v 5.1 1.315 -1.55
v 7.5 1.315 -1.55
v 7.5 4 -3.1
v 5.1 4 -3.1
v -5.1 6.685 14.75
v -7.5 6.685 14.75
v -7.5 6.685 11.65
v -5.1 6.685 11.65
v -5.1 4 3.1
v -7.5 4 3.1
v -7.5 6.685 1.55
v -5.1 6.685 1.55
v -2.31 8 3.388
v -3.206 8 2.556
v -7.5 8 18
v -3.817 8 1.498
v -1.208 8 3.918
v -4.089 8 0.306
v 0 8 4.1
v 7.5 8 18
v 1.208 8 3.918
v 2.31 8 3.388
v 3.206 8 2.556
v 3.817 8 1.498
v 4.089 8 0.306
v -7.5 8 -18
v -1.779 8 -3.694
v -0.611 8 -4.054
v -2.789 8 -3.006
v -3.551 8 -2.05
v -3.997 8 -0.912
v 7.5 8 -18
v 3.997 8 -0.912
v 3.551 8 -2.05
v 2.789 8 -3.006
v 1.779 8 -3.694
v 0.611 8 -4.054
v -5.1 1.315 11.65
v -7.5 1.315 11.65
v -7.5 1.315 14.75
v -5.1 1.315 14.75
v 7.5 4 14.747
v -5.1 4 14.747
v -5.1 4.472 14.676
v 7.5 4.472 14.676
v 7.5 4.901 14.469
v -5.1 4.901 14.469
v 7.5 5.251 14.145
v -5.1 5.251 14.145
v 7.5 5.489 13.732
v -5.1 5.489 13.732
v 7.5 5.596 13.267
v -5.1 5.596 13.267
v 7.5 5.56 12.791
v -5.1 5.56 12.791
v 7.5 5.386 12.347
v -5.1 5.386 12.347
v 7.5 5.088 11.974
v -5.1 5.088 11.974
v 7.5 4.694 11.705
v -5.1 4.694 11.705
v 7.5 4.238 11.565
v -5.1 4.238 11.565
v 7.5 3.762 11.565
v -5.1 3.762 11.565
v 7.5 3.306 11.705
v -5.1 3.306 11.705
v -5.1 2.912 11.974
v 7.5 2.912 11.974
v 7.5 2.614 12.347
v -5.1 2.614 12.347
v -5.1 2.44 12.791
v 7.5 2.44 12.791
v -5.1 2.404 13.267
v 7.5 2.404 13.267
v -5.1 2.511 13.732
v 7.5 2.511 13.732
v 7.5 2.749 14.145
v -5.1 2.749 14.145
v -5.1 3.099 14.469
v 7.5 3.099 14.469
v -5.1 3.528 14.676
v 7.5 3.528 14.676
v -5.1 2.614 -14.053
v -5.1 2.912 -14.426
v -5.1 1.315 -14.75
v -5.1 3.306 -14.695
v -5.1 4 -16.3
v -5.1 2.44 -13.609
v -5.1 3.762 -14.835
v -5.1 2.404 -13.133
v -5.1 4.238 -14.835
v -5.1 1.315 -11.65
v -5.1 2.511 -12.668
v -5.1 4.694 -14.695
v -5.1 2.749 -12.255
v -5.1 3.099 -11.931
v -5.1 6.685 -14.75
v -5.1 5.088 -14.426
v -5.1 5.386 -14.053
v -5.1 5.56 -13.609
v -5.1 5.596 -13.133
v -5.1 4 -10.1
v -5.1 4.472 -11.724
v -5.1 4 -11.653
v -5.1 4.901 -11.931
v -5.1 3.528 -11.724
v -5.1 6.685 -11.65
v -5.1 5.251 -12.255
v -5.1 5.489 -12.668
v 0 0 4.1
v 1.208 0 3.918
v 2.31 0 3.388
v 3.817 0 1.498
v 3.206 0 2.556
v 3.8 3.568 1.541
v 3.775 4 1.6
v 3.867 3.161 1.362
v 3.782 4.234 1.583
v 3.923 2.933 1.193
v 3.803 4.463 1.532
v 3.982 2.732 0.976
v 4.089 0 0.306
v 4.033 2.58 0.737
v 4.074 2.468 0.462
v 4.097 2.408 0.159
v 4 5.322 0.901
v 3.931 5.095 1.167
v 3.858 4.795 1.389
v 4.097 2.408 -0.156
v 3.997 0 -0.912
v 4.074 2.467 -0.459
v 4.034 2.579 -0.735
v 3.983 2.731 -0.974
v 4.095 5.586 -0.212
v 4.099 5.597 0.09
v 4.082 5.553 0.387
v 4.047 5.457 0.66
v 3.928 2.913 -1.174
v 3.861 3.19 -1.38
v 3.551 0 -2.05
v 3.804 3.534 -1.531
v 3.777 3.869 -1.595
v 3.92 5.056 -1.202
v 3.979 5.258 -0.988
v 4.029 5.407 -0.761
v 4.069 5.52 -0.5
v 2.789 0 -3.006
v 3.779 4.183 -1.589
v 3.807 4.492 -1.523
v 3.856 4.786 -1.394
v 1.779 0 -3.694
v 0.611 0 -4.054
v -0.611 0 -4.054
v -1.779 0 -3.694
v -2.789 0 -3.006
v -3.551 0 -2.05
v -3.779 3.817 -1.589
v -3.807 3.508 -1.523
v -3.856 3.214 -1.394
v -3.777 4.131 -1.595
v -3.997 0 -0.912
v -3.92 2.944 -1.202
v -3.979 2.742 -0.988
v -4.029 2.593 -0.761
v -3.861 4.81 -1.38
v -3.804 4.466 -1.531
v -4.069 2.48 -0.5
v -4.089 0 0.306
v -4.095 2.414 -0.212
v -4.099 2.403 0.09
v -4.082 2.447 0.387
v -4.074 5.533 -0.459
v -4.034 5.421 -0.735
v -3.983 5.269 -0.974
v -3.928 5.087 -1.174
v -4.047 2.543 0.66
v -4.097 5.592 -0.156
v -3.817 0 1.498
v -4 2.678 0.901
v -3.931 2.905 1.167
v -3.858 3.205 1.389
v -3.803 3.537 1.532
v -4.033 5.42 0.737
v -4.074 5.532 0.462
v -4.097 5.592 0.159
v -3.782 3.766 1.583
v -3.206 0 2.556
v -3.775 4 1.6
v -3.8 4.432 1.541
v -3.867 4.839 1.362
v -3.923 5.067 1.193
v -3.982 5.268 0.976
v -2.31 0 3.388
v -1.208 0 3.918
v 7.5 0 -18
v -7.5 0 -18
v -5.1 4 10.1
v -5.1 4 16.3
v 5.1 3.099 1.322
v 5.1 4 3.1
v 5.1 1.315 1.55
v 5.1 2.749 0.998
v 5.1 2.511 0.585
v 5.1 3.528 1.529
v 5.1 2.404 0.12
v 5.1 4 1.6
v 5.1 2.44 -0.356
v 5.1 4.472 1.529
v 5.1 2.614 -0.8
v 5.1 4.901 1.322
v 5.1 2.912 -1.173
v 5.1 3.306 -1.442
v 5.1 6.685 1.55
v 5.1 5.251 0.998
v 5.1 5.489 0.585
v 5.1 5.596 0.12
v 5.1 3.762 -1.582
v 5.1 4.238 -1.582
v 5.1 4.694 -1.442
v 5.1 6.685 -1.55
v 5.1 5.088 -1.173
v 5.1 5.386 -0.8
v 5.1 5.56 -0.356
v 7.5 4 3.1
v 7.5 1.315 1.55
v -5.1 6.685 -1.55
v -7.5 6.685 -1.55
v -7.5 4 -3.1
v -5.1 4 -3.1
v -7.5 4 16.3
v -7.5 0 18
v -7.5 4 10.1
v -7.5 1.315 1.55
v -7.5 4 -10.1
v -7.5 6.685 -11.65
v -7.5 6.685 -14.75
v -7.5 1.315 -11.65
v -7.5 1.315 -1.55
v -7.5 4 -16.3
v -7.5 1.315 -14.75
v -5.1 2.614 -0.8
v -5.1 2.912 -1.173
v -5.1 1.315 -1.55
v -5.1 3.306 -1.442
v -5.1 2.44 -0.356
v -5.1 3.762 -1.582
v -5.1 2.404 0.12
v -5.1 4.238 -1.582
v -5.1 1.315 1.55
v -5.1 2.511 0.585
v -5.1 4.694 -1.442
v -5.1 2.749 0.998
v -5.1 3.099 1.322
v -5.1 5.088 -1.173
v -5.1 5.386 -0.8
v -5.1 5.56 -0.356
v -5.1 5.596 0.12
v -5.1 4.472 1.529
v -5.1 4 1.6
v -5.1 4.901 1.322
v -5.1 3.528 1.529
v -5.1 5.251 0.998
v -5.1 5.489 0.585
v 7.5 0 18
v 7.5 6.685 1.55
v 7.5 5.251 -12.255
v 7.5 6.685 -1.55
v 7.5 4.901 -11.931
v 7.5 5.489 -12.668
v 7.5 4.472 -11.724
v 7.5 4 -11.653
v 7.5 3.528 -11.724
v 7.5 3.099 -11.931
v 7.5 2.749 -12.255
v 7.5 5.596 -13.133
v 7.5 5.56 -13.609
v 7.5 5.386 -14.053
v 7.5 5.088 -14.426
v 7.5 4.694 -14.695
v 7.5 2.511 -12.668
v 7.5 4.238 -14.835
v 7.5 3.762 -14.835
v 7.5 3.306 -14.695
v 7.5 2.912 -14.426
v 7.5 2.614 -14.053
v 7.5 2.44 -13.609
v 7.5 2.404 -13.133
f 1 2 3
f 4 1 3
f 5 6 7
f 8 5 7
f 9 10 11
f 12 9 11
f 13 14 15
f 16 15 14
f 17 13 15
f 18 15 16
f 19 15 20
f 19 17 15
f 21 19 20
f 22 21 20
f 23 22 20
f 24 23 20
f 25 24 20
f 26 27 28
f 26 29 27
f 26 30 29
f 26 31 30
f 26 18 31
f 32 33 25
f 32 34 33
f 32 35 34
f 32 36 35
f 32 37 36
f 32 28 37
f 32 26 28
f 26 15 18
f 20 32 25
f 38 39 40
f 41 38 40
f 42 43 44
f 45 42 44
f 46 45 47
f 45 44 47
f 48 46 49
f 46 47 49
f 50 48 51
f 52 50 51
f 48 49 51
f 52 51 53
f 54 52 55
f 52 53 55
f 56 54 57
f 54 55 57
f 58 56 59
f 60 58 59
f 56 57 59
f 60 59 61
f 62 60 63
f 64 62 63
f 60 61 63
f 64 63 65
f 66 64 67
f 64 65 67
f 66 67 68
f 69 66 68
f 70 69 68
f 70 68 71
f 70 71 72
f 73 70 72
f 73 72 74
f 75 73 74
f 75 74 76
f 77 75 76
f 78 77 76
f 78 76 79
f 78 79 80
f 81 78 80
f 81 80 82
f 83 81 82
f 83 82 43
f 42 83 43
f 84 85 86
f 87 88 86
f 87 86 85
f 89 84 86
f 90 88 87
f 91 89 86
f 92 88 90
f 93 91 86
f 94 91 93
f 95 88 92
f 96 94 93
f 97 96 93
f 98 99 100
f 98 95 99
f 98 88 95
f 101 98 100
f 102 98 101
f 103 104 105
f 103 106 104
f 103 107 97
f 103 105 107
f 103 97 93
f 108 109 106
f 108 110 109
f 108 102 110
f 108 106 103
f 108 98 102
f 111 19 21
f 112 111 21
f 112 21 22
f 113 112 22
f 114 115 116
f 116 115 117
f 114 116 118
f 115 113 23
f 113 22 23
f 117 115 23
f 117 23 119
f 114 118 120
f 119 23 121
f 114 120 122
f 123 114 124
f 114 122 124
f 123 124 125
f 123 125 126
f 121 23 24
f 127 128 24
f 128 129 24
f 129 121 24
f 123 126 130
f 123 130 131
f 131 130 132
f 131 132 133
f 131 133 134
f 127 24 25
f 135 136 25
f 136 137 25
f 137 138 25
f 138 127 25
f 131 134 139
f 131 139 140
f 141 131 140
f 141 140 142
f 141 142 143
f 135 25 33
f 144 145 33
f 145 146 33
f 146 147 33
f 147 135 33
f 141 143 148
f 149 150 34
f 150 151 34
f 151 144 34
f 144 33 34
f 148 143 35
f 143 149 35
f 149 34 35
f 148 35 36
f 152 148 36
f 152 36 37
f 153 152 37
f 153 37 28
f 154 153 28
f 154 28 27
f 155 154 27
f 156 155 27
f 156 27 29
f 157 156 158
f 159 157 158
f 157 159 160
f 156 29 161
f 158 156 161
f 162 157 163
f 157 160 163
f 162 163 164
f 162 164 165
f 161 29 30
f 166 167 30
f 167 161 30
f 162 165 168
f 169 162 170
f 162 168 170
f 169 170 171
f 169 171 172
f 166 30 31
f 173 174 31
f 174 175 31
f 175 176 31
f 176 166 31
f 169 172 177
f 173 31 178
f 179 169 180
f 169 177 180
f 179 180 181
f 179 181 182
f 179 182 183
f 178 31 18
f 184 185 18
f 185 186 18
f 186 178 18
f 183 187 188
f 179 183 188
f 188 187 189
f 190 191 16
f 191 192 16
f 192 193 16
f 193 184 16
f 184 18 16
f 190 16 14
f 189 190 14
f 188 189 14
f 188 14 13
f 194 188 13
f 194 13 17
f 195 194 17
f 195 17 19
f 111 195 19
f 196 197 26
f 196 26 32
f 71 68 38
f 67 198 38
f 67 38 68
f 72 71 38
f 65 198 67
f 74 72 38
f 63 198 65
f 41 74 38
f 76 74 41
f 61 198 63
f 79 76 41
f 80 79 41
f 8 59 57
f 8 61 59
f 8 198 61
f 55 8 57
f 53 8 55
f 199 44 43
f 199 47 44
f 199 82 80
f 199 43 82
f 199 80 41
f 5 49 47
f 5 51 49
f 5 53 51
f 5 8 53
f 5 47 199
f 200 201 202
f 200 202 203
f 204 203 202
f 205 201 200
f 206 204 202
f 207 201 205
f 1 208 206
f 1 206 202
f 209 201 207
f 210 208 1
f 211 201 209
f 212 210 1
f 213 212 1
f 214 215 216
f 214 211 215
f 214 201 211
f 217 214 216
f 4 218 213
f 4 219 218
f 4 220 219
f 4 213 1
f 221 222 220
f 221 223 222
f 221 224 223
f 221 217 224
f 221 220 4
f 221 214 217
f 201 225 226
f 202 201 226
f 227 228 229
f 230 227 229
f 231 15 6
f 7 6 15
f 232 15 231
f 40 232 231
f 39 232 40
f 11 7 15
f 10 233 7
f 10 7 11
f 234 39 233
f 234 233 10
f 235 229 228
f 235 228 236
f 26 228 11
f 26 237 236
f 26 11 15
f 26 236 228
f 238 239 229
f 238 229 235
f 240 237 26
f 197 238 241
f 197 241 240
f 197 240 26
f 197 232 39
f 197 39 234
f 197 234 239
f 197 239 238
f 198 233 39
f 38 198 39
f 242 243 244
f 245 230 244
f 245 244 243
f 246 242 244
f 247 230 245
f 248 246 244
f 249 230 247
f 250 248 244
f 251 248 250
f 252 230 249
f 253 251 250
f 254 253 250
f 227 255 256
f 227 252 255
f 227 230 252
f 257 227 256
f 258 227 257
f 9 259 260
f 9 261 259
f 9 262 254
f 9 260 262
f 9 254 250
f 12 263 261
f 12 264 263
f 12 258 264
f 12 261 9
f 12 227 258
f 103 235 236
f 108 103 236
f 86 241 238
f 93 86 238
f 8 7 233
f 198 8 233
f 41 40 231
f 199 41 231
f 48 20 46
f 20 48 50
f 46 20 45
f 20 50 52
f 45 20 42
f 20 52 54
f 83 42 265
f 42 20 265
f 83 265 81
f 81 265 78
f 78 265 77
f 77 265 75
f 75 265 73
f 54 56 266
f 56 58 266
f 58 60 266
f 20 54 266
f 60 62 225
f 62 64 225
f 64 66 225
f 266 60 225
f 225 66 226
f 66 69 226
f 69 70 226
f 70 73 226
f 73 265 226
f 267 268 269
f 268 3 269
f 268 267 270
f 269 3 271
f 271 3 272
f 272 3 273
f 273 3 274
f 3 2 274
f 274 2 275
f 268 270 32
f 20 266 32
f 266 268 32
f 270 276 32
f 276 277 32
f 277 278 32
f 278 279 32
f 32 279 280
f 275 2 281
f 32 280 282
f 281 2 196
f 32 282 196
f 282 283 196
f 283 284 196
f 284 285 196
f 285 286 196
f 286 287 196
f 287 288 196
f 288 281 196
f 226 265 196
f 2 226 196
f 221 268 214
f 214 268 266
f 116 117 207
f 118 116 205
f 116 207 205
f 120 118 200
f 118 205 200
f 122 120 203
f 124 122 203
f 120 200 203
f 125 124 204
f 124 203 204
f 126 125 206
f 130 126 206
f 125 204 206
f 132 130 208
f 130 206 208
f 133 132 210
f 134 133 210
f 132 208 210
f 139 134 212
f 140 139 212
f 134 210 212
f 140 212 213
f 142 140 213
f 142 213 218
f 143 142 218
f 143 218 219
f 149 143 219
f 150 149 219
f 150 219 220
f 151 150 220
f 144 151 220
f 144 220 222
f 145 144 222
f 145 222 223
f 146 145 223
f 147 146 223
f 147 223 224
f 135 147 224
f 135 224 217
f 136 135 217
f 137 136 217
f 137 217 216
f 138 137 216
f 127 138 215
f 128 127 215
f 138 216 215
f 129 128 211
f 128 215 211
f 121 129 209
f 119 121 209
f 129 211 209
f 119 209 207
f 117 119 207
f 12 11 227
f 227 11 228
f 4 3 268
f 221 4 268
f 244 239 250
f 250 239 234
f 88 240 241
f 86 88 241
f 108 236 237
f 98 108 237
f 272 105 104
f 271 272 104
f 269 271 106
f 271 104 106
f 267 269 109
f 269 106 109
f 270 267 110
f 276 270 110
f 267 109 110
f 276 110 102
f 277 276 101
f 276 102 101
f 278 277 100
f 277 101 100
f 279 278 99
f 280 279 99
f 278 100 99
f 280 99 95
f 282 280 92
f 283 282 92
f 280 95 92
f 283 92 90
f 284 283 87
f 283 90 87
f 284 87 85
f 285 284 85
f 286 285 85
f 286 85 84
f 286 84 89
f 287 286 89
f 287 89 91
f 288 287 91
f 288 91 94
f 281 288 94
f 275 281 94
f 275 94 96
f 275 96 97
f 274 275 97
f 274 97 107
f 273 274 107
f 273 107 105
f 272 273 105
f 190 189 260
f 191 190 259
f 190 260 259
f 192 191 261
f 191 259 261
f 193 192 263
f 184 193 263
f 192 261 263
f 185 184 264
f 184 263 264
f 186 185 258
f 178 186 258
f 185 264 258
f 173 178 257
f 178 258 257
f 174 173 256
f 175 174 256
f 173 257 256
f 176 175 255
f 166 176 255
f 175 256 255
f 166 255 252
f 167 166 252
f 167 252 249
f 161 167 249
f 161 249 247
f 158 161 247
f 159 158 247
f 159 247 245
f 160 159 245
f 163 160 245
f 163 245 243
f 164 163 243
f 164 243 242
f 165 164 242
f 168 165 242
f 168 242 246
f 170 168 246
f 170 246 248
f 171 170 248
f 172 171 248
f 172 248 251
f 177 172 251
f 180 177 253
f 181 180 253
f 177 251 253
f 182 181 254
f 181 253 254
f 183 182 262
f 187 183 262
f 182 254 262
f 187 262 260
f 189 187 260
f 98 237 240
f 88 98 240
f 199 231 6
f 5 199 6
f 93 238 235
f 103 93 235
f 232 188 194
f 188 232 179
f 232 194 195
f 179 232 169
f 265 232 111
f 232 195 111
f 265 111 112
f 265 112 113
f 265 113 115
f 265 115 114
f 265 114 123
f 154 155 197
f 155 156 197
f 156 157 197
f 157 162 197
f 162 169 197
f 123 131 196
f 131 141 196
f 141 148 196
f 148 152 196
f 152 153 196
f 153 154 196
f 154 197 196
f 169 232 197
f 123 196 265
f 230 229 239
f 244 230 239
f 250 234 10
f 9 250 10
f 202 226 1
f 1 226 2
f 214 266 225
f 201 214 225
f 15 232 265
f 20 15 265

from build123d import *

# Parameters (mm, degrees)
SKETCH2_W                = 15
SKETCH2_H                = 36
BOSS_EXTRUDE1_DEPTH      = 8
SKETCH4_R                = 4.1
CUT_EXTRUDE1_DEPTH       = 22.077238908
CUT_EXTRUDE2_DEPTH       = 2.4
CUT_EXTRUDE5_DEPTH       = 2.4
CUT_EXTRUDE8_DEPTH       = 2.4
CUT_EXTRUDE9_REACH       = 25.383
CUT_EXTRUDE9_END_RADIUS  = 4.1
SKETCH21_R               = 1.6
CUT_EXTRUDE10_REACH      = 25.383
CUT_EXTRUDE10_END_RADIUS = 4.1
SKETCH16_R               = 1.6
SKETCH24_R               = 1.6
CUT_EXTRUDE11_DEPTH      = 24.382899769


with BuildPart() as part:
    # Sketch2 → Boss-Extrude1 (new body)
    with BuildSketch(Plane(origin=(0, 0, 0), x_dir=(1, 0, 0), z_dir=(0, 1, 0))):
        Rectangle(SKETCH2_W, SKETCH2_H)
    extrude(amount=BOSS_EXTRUDE1_DEPTH)

    # Sketch4 → Cut-Extrude1 (cut, through all)
    with BuildSketch(Plane(origin=(0, 8, 0), x_dir=(1, 0, 0), z_dir=(0, 1, 0))):
        with Locations(Location((0, 0, 0), (0, 0, 270))):
            Circle(SKETCH4_R)
    extrude(amount=-CUT_EXTRUDE1_DEPTH, mode=Mode.SUBTRACT)

    # Sketch13 → Cut-Extrude2 (cut)
    with BuildSketch(Plane.ZY.offset(7.5)):
        Polygon((16.3, 4), (14.75, 6.684678752), (11.65, 6.684678752), (10.1, 4), (11.65, 1.315321248), (14.75, 1.315321248), align=None)
        Polygon((-10.1, 4), (-11.65, 6.684678752), (-14.75, 6.684678752), (-16.3, 4), (-14.75, 1.315321248), (-11.65, 1.315321248), align=None)
    extrude(amount=-CUT_EXTRUDE2_DEPTH, mode=Mode.SUBTRACT)

    # Sketch15 → Cut-Extrude5 (cut)
    with BuildSketch(Plane(origin=(7.5, 0, 0), x_dir=(0, 0, -1), z_dir=(1, 0, 0))):
        Polygon((-3.1, 4), (-1.55, 1.315321248), (1.55, 1.315321248), (3.1, 4), (1.55, 6.684678752), (-1.55, 6.684678752), align=None)
    extrude(amount=-CUT_EXTRUDE5_DEPTH, mode=Mode.SUBTRACT)

    # Sketch20 → Cut-Extrude8 (cut)
    with BuildSketch(Plane.ZY.offset(7.5)):
        Polygon((3.1, 4), (1.55, 6.684678752), (-1.55, 6.684678752), (-3.1, 4), (-1.55, 1.315321248), (1.55, 1.315321248), align=None)
    extrude(amount=-CUT_EXTRUDE8_DEPTH, mode=Mode.SUBTRACT)

    # Cut-Extrude9: up to this cylinder (the profile starts outside it)
    cut_extrude9_end = Plane(origin=(0, 4, 0), z_dir=(0, 1, 0)) * Cylinder(CUT_EXTRUDE9_END_RADIUS, 59.966, mode=Mode.PRIVATE)
    # Sketch21 → Cut-Extrude9 (cut, up to the surface)
    with BuildSketch(Plane.ZY.offset(5.1), mode=Mode.PRIVATE) as cut_extrude9_sk1:
        with Locations((0, 4)):
            Circle(SKETCH21_R)
    cut_extrude9_tool1 = extrude(cut_extrude9_sk1.sketch, amount=-CUT_EXTRUDE9_REACH, mode=Mode.PRIVATE) - cut_extrude9_end
    add(cut_extrude9_tool1.solids().sort_by_distance((-5.1, 4, 0))[0], mode=Mode.SUBTRACT)

    # Cut-Extrude10: up to this cylinder (the profile starts outside it)
    cut_extrude10_end = Plane(origin=(0, 4, 0), z_dir=(0, 1, 0)) * Cylinder(CUT_EXTRUDE10_END_RADIUS, 59.966, mode=Mode.PRIVATE)
    # Sketch16 → Cut-Extrude10 (cut, up to the surface)
    with BuildSketch(Plane(origin=(5.1, 0, 0), x_dir=(0, 0, -1), z_dir=(1, 0, 0)), mode=Mode.PRIVATE) as cut_extrude10_sk1:
        with Locations(Location((0, 4, 0), (0, 0, 180))):
            Circle(SKETCH16_R)
    cut_extrude10_tool1 = extrude(cut_extrude10_sk1.sketch, amount=-CUT_EXTRUDE10_REACH, mode=Mode.PRIVATE) - cut_extrude10_end
    add(cut_extrude10_tool1.solids().sort_by_distance((5.1, 4, 0))[0], mode=Mode.SUBTRACT)

    # Sketch24 → Cut-Extrude11 (cut, through all)
    with BuildSketch(Plane.ZY.offset(5.1)):
        with Locations((13.147013408, 4)):
            Circle(SKETCH24_R)
        with Locations((-13.252986592, 4)):
            Circle(SKETCH24_R)
    extrude(amount=-CUT_EXTRUDE11_DEPTH, mode=Mode.SUBTRACT)


solid = part.part
